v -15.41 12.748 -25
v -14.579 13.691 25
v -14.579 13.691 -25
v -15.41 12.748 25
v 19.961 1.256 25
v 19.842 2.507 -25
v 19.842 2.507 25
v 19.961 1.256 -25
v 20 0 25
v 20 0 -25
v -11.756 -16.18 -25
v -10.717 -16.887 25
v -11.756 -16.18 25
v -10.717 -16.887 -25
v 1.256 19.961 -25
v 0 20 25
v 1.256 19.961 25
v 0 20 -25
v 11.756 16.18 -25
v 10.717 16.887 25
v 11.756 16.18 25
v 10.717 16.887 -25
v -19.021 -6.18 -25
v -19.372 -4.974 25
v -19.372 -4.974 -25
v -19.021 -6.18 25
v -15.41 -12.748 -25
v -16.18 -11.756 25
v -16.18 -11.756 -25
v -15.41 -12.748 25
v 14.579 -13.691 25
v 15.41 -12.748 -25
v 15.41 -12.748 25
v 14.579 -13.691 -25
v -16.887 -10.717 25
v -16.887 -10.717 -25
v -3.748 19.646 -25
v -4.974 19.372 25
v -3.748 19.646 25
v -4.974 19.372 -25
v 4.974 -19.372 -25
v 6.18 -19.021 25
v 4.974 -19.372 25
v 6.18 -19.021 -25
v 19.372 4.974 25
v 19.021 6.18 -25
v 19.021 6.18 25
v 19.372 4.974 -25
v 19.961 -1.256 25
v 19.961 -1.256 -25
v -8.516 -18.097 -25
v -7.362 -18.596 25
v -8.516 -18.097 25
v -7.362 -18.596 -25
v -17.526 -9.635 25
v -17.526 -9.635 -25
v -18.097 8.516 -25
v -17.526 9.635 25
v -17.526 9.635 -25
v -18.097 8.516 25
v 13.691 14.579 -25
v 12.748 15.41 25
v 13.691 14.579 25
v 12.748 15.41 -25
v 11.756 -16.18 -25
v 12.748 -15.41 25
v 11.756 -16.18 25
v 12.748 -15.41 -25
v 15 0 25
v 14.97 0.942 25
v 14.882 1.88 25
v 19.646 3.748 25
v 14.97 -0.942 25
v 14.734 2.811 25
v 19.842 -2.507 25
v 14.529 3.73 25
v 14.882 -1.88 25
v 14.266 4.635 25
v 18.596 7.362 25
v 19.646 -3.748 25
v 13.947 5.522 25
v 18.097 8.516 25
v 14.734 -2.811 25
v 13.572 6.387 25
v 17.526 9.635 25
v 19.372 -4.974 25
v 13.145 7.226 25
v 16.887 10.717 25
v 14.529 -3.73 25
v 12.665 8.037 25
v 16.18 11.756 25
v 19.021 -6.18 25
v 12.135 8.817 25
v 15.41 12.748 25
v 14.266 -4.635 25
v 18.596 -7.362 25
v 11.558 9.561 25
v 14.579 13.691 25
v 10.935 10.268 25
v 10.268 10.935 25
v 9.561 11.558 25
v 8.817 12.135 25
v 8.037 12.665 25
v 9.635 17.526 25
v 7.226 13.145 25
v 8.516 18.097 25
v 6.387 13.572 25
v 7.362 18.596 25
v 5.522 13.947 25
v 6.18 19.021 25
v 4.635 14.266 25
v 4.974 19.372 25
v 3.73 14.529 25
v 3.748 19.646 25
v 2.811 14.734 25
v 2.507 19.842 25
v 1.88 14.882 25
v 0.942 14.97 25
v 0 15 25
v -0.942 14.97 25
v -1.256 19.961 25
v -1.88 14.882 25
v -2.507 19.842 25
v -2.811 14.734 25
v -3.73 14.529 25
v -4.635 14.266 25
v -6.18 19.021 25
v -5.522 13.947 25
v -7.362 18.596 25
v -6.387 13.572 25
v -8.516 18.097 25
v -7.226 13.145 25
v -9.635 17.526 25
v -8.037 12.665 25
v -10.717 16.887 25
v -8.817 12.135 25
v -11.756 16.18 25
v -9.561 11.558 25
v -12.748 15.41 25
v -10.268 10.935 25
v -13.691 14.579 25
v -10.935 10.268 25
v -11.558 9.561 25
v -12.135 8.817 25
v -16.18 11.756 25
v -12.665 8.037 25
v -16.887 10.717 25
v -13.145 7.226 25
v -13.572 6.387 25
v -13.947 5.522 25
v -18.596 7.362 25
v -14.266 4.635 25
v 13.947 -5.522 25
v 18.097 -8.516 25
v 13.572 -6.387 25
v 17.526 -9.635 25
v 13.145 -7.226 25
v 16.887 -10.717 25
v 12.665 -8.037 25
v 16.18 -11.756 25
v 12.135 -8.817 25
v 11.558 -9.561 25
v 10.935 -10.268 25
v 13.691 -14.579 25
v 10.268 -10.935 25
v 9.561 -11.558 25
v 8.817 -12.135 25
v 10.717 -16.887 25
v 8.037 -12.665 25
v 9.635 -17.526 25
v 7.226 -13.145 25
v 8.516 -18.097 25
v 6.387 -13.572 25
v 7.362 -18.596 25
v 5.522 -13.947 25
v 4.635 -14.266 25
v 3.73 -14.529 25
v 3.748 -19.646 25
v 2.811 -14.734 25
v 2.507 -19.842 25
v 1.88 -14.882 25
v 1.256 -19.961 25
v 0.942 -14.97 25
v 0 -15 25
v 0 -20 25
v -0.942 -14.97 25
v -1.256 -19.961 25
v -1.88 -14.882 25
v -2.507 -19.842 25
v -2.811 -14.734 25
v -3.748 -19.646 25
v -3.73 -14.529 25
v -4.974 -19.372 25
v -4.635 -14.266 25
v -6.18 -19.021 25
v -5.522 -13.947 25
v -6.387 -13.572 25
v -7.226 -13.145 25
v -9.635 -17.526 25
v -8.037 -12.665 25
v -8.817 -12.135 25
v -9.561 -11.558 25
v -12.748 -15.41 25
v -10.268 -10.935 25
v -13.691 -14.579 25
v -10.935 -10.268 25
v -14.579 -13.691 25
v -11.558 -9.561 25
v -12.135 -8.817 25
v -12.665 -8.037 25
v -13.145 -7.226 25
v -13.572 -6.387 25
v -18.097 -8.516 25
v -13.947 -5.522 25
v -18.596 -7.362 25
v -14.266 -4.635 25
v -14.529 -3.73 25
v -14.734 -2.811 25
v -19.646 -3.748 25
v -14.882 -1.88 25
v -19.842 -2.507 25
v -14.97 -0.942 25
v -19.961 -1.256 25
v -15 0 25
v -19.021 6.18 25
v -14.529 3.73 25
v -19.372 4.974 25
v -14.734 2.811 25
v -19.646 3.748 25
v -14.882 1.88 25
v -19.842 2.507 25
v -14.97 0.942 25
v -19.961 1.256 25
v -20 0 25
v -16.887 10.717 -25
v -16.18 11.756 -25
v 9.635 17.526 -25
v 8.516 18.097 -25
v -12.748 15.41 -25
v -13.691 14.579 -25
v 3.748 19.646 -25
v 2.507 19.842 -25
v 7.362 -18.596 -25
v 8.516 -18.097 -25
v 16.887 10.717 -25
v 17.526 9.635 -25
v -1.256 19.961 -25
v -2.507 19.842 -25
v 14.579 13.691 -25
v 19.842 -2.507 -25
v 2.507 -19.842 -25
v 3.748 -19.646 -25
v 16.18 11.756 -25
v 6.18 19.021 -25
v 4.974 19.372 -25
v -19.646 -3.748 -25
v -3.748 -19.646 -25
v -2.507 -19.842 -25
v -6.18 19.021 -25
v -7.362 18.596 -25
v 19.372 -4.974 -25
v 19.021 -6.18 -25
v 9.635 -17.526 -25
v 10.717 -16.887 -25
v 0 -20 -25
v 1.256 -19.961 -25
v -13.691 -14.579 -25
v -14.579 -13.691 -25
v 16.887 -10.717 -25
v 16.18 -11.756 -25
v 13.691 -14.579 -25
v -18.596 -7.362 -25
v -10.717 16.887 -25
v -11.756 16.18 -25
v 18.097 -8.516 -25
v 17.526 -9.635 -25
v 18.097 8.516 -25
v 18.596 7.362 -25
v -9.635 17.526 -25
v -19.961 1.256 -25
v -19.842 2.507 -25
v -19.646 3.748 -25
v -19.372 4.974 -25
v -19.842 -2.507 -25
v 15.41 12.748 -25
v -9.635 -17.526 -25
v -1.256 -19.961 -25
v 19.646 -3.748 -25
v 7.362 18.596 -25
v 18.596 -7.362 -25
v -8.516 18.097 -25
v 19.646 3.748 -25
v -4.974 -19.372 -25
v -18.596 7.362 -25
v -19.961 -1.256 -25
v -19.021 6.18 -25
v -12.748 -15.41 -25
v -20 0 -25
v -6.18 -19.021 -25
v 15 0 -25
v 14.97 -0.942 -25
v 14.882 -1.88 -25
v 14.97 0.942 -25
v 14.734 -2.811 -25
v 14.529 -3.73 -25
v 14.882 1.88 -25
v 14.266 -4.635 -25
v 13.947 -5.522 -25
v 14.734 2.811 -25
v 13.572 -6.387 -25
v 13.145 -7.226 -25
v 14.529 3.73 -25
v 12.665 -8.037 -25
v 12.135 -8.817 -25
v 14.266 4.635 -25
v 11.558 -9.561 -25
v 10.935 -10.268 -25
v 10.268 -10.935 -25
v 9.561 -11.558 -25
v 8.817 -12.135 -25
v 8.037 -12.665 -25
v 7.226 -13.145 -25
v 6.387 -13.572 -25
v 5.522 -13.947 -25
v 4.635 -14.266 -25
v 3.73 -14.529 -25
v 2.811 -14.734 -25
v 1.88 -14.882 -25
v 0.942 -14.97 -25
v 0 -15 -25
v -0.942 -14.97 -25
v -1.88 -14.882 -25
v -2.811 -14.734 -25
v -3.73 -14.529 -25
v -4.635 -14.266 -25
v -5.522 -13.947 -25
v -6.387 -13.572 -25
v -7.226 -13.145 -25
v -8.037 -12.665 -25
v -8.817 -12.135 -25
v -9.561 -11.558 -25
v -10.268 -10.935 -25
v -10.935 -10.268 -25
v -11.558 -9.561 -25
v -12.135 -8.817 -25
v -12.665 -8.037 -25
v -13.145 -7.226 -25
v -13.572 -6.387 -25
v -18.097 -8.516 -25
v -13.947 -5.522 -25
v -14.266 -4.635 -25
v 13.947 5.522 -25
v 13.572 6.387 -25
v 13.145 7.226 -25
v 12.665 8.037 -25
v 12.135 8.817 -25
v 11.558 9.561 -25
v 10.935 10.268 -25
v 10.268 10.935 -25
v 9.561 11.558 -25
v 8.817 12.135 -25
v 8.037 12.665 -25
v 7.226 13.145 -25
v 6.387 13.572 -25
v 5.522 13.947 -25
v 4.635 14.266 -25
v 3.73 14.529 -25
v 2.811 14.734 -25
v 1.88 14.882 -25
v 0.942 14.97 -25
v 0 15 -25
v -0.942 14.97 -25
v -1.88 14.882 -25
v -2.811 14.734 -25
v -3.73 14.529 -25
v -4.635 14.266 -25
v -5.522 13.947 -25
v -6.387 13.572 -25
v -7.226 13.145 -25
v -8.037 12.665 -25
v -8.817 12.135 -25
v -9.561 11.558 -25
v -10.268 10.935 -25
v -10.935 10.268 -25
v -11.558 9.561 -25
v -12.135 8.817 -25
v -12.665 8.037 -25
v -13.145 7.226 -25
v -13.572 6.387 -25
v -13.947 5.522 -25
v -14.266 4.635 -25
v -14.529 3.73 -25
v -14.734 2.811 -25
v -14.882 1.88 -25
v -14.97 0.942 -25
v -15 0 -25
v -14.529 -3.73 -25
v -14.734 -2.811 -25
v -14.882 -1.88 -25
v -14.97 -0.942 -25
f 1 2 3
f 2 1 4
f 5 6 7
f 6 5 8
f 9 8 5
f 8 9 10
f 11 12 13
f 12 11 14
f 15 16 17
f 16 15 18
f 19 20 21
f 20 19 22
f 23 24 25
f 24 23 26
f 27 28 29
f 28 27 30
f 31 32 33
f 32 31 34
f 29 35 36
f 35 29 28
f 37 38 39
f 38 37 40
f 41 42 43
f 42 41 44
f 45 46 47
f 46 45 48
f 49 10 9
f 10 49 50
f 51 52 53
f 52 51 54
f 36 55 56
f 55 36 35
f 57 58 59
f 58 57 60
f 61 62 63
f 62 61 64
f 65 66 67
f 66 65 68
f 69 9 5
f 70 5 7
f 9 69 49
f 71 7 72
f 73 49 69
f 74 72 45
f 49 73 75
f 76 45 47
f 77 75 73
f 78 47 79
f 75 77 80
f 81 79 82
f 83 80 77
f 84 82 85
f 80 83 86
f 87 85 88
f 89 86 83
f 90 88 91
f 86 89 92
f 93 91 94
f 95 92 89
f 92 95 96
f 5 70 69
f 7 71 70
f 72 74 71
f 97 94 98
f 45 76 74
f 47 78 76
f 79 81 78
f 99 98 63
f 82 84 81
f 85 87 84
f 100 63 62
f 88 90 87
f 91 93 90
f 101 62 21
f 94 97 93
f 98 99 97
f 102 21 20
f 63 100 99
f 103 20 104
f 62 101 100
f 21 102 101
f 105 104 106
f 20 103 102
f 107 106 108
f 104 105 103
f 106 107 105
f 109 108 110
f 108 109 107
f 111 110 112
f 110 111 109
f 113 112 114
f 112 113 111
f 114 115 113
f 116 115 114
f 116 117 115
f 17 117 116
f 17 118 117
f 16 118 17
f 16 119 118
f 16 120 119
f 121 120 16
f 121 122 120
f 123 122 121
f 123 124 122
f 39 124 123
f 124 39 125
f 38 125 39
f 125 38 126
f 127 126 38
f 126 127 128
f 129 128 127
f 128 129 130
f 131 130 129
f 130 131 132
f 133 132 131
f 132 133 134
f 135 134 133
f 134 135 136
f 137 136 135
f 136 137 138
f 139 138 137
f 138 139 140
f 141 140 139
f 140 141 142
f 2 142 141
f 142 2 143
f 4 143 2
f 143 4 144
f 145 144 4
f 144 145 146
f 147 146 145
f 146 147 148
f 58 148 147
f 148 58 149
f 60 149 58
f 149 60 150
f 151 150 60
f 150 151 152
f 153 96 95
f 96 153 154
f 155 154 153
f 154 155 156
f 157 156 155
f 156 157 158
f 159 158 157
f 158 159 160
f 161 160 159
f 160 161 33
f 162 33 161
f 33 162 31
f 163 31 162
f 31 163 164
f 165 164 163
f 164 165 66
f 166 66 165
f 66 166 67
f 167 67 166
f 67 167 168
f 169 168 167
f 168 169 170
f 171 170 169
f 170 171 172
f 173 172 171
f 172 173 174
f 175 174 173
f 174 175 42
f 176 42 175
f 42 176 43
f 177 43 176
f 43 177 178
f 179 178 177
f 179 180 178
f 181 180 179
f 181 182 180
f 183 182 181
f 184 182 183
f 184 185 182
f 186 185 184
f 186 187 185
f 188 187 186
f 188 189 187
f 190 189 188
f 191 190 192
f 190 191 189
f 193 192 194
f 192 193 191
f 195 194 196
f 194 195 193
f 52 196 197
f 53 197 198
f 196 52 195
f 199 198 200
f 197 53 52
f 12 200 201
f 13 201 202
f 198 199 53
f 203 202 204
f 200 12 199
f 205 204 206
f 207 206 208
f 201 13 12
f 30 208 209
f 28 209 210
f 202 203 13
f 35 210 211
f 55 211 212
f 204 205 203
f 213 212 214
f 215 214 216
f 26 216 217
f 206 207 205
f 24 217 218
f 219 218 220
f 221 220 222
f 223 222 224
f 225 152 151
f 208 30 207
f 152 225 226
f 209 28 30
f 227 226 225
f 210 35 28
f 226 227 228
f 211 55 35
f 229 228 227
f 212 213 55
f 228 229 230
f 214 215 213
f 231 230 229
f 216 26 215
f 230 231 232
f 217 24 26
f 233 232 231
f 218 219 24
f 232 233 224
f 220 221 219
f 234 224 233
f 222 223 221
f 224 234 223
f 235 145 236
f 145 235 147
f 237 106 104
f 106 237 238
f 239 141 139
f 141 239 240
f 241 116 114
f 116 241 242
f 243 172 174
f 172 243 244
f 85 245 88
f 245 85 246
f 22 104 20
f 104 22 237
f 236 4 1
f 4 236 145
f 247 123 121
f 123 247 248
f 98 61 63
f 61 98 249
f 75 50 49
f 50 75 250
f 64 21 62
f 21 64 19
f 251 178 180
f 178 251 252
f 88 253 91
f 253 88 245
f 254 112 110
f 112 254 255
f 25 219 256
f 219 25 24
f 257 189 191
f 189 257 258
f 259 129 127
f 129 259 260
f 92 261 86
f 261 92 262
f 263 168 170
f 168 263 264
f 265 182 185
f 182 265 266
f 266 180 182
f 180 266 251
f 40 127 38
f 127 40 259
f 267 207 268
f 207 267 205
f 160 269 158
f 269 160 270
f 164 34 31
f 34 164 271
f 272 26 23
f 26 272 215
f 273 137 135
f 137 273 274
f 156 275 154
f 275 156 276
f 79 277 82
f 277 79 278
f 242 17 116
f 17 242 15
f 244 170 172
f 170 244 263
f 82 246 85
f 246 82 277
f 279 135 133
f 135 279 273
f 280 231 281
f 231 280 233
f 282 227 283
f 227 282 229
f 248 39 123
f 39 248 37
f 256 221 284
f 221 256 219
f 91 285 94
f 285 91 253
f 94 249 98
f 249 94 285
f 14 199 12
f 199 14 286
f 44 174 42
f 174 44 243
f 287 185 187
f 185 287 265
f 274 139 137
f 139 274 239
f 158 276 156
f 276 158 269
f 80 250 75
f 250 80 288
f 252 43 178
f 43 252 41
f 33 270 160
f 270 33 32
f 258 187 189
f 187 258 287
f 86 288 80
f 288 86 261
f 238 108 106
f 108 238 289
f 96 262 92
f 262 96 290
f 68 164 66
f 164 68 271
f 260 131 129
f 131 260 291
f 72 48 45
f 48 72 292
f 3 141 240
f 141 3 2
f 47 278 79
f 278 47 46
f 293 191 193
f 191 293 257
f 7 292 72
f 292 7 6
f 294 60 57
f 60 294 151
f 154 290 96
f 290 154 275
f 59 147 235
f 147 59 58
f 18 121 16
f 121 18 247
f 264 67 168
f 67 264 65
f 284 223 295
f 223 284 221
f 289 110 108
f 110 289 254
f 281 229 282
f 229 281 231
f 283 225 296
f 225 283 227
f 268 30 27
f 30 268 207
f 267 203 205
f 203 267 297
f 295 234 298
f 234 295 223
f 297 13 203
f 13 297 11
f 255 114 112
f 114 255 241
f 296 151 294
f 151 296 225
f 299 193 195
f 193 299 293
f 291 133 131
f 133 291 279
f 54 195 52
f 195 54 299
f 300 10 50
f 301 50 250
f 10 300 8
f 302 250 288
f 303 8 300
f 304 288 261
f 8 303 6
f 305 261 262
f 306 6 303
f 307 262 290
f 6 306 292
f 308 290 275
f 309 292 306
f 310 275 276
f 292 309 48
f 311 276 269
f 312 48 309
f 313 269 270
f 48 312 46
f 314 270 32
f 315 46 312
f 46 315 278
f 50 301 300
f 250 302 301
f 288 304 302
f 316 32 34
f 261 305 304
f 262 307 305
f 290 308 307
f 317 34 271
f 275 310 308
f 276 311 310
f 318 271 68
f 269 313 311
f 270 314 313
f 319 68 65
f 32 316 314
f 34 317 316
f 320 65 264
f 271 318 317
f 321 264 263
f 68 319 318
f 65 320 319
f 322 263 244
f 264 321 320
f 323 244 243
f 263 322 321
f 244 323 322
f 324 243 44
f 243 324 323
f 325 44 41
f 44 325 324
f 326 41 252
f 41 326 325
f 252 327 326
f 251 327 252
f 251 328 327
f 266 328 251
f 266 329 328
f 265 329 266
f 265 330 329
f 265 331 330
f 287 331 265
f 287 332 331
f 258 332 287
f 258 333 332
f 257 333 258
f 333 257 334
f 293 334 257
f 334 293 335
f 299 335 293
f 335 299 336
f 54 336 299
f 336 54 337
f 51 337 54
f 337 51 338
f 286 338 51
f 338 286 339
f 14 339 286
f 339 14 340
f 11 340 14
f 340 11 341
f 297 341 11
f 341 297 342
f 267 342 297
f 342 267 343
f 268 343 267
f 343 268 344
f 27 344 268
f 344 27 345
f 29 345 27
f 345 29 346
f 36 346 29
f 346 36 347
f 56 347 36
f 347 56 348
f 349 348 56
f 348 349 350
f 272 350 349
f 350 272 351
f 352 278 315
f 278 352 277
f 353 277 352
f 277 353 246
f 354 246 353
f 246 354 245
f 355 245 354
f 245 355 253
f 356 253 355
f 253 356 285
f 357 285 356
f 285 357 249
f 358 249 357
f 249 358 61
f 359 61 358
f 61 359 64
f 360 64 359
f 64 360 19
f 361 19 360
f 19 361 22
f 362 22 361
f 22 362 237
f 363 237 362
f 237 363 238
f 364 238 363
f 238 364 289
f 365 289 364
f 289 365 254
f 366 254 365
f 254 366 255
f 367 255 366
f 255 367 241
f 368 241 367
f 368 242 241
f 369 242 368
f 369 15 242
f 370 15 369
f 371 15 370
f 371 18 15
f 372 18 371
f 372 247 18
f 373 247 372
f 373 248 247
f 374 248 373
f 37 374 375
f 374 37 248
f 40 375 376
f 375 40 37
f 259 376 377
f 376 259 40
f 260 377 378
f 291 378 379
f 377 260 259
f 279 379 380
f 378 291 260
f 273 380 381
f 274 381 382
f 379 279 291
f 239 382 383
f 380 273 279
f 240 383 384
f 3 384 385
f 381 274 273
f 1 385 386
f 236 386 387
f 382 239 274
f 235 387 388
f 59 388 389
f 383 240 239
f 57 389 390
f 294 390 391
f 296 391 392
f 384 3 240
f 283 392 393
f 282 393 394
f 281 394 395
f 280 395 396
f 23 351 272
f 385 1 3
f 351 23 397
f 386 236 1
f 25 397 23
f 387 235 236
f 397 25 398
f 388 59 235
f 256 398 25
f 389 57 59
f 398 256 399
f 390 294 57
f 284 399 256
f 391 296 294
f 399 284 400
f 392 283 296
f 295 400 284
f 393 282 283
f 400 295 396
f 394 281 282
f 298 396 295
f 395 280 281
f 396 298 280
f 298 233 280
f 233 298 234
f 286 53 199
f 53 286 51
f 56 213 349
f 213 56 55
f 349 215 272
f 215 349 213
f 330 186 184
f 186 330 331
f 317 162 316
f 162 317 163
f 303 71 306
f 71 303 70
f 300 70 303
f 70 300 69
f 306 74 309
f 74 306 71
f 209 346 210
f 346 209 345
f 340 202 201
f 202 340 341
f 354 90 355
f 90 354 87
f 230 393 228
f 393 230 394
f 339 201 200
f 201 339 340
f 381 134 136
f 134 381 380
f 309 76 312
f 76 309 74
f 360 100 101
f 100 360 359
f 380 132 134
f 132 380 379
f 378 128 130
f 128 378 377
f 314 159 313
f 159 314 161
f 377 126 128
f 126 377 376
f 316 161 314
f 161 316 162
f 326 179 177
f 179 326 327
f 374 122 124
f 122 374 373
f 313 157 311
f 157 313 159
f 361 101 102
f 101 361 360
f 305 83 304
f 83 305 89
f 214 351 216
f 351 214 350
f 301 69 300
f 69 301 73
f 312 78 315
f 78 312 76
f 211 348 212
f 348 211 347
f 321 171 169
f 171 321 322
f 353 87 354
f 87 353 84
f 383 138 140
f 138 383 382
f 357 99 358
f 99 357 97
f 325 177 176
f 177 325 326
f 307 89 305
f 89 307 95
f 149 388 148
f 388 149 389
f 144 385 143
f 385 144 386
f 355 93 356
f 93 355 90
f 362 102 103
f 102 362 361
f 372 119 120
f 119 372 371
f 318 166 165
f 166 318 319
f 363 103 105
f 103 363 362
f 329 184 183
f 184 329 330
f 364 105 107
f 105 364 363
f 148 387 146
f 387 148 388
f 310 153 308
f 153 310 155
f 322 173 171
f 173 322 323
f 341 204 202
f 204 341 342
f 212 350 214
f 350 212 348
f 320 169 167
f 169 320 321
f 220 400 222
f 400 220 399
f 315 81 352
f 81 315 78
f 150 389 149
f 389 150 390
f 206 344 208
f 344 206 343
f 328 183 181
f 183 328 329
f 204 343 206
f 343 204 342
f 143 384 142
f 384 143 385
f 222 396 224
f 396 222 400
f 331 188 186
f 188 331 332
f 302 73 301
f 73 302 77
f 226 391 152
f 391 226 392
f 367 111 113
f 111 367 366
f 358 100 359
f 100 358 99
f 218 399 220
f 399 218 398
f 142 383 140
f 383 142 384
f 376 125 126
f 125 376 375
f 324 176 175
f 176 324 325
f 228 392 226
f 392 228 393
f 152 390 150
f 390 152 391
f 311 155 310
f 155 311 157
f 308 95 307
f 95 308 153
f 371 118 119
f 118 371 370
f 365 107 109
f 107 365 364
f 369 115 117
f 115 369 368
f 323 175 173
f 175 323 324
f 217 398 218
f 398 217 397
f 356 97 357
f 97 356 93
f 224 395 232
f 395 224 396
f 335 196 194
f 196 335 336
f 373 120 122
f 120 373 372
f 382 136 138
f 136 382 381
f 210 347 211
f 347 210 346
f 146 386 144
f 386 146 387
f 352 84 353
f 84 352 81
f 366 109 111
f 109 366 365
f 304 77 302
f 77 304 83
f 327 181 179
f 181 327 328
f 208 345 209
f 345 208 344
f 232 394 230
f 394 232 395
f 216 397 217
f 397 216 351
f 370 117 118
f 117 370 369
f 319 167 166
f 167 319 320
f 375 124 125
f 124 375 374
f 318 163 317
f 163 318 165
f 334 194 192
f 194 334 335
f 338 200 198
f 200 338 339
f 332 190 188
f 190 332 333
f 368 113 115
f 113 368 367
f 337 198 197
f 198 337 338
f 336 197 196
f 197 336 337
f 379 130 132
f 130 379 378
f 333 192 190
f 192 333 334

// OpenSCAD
// Hollow Cylinder - Cilindro Cavo
// Parametri personalizzabili

// Altezza del cilindro
height = 50;

// Raggio esterno
outer_radius = 20;

// Raggio interno (spessore parete = outer_radius - inner_radius)
inner_radius = 15;

// Risoluzione (numero di facce per approssimare il cerchio)
$fn = 100;

// Cilindro cavo: differenza tra cilindro esterno e cilindro interno
difference() {
    cylinder(h = height, r = outer_radius, center = true);
    cylinder(h = height + 1, r = inner_radius, center = true);
}
